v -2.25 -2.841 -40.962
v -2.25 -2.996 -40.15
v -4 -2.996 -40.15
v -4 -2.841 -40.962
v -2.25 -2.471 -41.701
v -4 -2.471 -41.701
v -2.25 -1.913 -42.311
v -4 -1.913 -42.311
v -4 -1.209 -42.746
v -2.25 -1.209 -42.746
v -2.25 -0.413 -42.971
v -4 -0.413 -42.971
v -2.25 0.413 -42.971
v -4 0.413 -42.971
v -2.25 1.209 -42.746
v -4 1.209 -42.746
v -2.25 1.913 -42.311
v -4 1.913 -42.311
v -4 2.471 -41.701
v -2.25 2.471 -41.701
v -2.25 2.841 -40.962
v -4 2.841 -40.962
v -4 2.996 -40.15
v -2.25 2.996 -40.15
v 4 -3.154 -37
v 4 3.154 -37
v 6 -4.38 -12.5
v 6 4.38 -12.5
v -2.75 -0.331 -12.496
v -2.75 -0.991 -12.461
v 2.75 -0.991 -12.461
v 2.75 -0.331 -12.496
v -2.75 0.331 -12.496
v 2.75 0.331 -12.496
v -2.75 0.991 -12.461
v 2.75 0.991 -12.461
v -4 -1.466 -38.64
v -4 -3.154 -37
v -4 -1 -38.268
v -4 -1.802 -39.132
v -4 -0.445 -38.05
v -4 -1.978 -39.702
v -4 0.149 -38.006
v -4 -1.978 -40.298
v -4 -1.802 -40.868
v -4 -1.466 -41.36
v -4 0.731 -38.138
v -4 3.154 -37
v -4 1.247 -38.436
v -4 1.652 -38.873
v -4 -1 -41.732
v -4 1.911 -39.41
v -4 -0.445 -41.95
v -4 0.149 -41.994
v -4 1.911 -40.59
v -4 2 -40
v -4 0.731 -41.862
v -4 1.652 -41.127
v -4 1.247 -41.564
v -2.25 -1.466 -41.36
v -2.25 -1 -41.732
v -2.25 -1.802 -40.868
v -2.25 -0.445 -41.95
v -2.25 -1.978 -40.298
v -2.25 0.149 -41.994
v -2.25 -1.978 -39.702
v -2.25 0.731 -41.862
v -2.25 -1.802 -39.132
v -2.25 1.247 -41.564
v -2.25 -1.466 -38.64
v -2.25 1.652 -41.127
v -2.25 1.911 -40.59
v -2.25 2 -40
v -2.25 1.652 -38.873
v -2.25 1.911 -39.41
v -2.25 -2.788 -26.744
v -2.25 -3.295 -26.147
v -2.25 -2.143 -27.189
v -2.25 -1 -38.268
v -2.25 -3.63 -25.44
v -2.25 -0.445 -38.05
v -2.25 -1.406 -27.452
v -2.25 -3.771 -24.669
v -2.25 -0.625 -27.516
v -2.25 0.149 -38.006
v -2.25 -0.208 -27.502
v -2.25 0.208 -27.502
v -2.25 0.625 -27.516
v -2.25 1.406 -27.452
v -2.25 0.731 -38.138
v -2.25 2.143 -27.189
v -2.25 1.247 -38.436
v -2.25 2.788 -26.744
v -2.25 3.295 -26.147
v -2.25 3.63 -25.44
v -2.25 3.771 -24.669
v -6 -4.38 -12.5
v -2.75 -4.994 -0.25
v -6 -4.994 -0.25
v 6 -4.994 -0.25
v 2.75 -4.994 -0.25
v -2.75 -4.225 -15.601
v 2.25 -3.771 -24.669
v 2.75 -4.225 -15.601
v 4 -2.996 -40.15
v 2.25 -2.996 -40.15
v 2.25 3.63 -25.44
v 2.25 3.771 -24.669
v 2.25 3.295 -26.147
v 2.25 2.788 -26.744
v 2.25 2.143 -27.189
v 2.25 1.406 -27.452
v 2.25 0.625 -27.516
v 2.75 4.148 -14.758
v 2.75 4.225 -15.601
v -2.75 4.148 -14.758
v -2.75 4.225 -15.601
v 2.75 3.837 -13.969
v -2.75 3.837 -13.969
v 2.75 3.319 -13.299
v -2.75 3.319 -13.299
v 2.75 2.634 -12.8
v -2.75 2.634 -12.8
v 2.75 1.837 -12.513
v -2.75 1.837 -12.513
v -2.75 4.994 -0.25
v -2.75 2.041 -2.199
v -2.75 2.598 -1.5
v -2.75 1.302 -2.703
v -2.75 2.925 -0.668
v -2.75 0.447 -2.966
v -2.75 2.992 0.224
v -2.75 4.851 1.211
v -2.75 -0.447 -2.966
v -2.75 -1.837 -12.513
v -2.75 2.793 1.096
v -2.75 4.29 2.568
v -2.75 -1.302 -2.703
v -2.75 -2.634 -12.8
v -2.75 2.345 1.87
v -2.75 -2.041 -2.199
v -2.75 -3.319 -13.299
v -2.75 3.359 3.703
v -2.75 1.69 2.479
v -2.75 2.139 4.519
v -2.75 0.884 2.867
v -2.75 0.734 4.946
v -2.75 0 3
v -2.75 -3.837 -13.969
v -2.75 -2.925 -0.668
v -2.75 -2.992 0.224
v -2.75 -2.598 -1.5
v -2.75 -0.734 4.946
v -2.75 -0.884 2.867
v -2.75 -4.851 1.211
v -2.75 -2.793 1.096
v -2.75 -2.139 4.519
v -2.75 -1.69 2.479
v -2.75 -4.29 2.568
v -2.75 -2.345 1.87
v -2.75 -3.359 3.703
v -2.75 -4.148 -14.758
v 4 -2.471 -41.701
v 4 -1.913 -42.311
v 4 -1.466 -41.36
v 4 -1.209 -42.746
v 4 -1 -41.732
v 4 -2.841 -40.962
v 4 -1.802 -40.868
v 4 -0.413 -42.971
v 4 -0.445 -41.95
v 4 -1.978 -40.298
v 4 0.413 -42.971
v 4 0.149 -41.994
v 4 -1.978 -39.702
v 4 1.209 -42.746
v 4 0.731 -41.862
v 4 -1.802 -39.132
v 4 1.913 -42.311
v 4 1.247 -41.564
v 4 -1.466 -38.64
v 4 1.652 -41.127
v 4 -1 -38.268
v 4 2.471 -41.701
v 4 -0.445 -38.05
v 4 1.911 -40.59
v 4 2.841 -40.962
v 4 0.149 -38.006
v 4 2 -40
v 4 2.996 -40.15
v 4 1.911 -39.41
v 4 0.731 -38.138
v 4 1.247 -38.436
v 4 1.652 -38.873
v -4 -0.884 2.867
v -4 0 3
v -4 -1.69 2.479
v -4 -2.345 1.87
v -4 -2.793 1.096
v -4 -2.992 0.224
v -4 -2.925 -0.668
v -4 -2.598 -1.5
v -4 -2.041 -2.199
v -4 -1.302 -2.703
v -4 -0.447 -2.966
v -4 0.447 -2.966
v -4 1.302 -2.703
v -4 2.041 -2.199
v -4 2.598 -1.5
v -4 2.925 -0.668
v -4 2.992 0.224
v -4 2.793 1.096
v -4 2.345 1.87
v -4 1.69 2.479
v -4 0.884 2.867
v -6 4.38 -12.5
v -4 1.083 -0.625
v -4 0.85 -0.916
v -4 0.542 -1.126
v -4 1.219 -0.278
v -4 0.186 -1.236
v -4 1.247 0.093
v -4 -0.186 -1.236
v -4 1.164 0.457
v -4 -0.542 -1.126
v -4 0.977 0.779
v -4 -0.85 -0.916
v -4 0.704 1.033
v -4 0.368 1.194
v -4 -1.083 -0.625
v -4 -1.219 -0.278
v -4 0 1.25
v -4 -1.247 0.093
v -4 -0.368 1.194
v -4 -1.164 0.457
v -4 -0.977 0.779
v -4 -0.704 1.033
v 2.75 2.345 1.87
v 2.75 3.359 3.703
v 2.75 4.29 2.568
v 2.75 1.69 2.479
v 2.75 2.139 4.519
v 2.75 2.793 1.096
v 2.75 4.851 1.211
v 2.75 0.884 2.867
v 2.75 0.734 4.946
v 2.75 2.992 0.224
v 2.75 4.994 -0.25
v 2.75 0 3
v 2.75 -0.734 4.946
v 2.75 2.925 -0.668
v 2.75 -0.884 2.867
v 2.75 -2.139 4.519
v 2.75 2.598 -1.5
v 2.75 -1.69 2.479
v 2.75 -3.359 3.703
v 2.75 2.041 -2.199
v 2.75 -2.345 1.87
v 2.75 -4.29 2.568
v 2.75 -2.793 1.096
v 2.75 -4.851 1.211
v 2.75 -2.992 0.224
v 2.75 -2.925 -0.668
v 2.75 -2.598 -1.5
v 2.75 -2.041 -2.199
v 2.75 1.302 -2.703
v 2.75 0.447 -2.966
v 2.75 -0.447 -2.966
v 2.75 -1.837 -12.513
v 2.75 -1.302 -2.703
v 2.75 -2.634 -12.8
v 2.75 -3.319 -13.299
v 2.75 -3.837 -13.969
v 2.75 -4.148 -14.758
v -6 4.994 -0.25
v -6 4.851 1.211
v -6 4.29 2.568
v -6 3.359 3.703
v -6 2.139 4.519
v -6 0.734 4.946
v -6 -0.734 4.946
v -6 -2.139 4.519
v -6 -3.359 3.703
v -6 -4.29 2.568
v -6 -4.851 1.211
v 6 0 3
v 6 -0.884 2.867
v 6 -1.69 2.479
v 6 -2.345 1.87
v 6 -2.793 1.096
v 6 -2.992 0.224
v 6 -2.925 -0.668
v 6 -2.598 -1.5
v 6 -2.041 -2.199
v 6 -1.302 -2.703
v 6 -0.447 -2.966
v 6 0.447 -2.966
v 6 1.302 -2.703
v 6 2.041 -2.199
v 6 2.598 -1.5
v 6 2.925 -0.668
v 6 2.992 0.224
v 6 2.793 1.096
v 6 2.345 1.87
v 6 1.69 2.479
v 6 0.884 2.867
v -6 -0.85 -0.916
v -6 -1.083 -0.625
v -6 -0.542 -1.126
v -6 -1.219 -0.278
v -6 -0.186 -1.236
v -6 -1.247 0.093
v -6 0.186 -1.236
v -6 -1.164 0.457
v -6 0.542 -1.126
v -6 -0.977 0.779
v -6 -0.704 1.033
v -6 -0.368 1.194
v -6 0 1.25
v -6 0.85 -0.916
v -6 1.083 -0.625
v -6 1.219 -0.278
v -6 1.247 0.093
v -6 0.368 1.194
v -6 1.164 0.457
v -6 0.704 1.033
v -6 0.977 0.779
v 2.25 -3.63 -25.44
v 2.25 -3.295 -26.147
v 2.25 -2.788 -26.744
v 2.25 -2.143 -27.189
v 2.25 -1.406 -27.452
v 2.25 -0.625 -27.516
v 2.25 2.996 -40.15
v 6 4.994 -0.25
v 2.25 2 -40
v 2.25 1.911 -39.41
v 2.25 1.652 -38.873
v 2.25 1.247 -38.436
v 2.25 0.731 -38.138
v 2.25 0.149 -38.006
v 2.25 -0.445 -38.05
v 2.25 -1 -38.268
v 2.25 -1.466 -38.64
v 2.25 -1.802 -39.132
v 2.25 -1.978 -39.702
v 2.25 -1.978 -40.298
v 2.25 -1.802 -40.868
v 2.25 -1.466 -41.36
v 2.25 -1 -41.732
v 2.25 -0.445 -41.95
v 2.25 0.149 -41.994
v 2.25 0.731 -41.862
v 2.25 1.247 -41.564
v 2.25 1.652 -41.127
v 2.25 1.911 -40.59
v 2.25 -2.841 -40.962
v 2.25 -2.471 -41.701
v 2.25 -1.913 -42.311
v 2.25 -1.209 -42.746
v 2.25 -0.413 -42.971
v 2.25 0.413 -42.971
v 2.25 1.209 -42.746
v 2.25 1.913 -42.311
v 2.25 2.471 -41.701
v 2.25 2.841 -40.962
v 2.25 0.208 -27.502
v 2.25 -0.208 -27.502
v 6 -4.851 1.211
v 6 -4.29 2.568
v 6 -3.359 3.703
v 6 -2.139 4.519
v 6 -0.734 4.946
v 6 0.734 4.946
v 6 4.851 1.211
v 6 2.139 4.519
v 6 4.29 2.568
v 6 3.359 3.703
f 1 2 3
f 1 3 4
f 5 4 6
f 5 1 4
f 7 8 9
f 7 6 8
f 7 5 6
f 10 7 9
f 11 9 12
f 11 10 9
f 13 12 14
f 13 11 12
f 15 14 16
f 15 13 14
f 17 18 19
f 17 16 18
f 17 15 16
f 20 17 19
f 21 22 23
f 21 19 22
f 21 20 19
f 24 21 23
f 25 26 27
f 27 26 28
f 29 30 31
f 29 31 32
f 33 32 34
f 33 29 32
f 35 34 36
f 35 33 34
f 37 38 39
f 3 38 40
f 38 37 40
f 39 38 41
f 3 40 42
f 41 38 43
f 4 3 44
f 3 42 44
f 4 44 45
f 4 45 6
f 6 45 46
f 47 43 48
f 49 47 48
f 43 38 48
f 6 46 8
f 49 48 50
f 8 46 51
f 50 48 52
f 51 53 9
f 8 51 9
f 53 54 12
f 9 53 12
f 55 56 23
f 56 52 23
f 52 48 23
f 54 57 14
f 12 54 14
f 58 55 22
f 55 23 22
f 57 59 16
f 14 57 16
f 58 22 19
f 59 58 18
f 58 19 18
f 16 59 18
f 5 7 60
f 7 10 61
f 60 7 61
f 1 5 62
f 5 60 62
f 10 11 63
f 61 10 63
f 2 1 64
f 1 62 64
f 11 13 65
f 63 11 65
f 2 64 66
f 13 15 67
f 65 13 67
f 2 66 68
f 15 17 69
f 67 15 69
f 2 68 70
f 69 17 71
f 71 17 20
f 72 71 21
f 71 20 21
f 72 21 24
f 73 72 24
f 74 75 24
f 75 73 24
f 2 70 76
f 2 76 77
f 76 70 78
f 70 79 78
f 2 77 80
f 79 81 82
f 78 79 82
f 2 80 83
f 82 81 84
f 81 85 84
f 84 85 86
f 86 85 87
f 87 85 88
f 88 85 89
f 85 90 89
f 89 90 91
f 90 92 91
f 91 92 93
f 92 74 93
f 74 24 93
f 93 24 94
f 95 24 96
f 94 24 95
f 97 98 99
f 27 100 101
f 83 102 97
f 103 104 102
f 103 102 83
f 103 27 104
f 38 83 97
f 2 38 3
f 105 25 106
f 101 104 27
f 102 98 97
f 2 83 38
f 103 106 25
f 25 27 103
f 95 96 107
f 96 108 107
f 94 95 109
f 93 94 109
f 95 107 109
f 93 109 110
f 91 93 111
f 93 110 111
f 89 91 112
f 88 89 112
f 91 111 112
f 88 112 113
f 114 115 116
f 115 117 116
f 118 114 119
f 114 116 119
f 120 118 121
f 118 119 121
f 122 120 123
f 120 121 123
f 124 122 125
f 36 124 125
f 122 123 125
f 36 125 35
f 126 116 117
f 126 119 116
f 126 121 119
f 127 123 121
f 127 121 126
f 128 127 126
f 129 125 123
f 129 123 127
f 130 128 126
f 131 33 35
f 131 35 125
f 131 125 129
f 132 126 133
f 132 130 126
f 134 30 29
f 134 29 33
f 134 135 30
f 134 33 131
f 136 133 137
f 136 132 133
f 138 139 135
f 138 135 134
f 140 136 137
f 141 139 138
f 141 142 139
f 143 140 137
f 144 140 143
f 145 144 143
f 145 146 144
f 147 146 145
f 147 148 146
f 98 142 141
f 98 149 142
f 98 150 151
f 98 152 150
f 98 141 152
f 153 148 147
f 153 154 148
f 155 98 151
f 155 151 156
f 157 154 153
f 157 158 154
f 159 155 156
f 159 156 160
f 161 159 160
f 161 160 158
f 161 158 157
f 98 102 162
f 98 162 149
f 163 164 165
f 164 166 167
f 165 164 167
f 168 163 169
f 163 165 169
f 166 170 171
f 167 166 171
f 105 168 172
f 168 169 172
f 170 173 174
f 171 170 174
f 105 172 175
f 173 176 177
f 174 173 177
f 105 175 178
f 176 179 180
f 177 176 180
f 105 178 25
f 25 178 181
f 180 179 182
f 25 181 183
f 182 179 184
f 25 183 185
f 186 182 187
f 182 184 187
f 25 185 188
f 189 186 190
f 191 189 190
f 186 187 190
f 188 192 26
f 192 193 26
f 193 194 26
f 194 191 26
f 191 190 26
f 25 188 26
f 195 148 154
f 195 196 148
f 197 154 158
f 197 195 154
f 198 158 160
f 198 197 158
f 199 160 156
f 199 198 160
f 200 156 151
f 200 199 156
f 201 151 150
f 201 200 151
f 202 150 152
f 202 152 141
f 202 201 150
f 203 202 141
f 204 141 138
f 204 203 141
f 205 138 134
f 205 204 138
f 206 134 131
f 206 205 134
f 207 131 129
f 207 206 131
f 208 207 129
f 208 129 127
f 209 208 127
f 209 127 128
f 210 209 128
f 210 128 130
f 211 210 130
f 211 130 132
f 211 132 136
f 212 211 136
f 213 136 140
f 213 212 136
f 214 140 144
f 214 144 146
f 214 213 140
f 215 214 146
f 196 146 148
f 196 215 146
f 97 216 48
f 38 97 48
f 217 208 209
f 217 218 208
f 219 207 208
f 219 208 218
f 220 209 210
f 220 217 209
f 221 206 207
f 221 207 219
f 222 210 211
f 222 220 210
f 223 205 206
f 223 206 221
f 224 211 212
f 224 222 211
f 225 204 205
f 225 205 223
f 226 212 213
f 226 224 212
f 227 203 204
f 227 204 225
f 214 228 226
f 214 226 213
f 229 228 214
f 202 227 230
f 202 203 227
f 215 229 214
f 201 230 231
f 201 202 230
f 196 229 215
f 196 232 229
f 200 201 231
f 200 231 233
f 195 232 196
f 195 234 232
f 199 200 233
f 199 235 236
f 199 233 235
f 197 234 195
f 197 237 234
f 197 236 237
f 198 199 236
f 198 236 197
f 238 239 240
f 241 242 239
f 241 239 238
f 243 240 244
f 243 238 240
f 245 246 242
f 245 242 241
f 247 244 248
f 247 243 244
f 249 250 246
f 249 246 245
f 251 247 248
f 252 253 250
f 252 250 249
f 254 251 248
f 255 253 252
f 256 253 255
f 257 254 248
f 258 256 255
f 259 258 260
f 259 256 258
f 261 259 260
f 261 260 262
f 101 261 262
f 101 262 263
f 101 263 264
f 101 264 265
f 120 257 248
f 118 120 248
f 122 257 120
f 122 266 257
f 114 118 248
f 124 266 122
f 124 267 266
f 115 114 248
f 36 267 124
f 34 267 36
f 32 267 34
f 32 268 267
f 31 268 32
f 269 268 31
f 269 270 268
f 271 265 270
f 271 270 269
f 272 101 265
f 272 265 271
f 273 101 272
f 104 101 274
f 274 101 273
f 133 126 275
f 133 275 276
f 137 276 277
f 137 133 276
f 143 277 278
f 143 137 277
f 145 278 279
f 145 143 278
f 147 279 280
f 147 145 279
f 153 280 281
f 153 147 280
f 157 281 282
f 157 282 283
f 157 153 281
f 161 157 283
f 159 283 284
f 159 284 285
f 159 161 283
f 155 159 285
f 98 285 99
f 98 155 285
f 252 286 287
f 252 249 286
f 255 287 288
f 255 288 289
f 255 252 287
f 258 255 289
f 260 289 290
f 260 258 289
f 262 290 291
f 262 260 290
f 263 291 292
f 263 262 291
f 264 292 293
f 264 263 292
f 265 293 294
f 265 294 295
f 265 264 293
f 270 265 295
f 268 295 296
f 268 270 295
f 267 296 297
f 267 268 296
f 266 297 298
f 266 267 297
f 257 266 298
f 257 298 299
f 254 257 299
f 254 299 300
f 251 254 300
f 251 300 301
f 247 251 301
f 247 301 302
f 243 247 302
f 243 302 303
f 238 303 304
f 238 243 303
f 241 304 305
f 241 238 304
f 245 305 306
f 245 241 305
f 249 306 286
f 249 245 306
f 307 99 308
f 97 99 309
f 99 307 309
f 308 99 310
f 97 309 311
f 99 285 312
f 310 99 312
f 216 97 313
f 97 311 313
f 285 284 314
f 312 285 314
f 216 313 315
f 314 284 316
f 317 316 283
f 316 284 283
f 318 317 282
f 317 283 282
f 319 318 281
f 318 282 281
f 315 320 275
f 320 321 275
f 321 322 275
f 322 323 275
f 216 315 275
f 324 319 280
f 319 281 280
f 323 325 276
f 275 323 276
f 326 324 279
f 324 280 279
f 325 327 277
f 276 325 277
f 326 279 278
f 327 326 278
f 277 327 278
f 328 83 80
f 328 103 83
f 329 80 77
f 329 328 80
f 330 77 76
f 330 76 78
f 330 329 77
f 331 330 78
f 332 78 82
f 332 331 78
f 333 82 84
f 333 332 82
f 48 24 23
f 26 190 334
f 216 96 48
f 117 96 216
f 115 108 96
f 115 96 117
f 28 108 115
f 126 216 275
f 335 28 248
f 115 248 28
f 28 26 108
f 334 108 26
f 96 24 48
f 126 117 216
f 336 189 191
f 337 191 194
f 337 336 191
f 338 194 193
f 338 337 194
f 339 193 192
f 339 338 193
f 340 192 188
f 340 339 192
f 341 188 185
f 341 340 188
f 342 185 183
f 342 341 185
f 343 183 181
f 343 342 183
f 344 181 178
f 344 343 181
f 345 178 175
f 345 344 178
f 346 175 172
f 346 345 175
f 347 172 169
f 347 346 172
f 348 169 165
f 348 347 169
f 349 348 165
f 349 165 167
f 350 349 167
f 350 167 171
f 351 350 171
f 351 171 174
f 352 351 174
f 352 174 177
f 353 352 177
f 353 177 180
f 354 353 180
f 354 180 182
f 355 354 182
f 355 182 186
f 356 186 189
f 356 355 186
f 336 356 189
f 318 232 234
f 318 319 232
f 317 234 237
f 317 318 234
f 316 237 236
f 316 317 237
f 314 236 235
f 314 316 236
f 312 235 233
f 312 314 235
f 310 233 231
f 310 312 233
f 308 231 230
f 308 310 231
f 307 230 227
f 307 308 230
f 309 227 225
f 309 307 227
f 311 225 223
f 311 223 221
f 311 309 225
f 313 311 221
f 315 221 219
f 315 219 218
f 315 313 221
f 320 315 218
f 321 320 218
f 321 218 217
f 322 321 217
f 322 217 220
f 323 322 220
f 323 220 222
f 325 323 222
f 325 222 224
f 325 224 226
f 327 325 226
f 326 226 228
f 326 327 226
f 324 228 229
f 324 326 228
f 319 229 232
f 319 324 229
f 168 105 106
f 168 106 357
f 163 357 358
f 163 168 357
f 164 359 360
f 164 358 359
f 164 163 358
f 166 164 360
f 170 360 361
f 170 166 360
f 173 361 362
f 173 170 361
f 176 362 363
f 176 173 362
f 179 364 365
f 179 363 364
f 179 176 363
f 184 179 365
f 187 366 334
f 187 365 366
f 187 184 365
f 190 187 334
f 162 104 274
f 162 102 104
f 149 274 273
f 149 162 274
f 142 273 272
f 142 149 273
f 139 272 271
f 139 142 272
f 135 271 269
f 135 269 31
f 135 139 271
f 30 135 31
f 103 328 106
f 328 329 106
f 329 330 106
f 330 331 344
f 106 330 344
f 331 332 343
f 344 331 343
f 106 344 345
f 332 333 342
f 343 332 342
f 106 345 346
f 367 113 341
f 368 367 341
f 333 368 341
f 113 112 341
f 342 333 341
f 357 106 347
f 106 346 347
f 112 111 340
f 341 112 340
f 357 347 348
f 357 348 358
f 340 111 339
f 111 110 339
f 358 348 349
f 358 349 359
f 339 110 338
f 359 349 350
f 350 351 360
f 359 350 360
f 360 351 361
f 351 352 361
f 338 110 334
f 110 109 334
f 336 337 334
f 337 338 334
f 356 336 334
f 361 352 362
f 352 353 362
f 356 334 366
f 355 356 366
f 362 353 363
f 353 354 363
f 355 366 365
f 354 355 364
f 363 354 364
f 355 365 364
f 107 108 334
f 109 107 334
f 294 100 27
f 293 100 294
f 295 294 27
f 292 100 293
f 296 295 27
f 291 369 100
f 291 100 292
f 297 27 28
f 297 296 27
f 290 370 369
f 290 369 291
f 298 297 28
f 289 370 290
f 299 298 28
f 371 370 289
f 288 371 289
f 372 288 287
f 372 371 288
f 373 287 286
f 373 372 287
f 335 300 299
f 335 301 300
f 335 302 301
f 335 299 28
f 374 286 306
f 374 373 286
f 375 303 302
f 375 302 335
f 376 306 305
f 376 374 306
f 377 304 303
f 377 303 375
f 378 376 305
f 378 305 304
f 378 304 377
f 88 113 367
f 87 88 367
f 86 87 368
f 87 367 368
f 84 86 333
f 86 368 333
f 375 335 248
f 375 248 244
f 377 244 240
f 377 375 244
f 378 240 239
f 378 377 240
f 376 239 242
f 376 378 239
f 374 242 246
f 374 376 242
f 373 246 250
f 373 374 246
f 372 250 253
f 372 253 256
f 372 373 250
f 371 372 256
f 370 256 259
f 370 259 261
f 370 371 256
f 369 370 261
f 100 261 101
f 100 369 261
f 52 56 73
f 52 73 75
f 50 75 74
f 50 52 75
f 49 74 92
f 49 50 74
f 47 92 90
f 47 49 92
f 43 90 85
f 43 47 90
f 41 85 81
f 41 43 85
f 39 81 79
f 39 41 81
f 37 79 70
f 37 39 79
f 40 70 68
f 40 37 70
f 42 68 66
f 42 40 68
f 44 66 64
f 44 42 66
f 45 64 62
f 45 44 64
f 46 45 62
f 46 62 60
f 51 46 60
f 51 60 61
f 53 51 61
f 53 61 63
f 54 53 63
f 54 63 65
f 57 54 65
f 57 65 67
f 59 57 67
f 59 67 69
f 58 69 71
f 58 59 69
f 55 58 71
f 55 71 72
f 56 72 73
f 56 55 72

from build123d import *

# Parameters (mm, degrees)
F0_R     = 2
F0_R_2   = 1
F1_DEPTH = 6
F7_START = -5.001
F7_DEPTH = 10.002
F8_R     = 3


with BuildPart() as f1:
    # F0 (on Right) → F1 (new body, symmetric)
    with BuildSketch(Plane.YZ):
        with BuildLine():
            Line((2.9962476533, -40.15), (4.9937460889, -0.25))
            ThreePointArc((4.9937460889, -0.25), (0, 5), (-4.9937460889, -0.25))
            Line((-4.9937460889, -0.25), (-2.9962476533, -40.15))
            ThreePointArc((-2.9962476533, -40.15), (0, -43), (2.9962476533, -40.15))
        make_face()
        with Locations((0, -40)):
            Circle(F0_R, mode=Mode.SUBTRACT)
        Circle(F0_R_2, mode=Mode.SUBTRACT)
    extrude(amount=F1_DEPTH, both=True)

    # F2 (on Front) → F3 (revolve, cut)
    with BuildSketch(Plane.XZ):
        Polygon((2.75, 12.5), (-2.75, 12.5), (-2.75, 3), (-4, 3), (-4, 1.25), (-6, 1.25), (-6, 0), (6, 0), (6, 3), (2.75, 3), align=None)
    revolve(axis=Axis((0, 0, 0), (1, 0, 0)), mode=Mode.SUBTRACT)

    # F4 (on Front) → F5 (revolve, cut)
    with BuildSketch(Plane.XZ):
        Polygon((-2.25, -52.5), (0, -52.5), (2.25, -52.5), (2.25, -42), (6, -42), (6, -40), (-6, -40), (-6, -42), (-2.25, -42), align=None)
    revolve(axis=Axis((0, 0, -40), (1, 0, 0)), mode=Mode.SUBTRACT)

    # F6 (on Front) → F7 (intersect)
    with BuildSketch(Plane.XZ.offset(F7_START)):
        Polygon((-4, -43), (0, -43), (4, -43), (4, -37), (6, -12.5), (6, 5), (0, 5), (-6, 5), (-6, -12.5), (-4, -37), align=None)
    extrude(amount=F7_DEPTH, mode=Mode.INTERSECT)

    # F8
    f8_edges = [f1.edges().sort_by_distance(p)[0] for p in [
        (0, -4.420924, -11.69211),
        (0, 4.420924, -11.69211),
        (0, 3.602981, -28.030517),
        (0, -3.602981, -28.030517),
    ]]
    fillet(f8_edges, radius=F8_R)


solid = f1.part
